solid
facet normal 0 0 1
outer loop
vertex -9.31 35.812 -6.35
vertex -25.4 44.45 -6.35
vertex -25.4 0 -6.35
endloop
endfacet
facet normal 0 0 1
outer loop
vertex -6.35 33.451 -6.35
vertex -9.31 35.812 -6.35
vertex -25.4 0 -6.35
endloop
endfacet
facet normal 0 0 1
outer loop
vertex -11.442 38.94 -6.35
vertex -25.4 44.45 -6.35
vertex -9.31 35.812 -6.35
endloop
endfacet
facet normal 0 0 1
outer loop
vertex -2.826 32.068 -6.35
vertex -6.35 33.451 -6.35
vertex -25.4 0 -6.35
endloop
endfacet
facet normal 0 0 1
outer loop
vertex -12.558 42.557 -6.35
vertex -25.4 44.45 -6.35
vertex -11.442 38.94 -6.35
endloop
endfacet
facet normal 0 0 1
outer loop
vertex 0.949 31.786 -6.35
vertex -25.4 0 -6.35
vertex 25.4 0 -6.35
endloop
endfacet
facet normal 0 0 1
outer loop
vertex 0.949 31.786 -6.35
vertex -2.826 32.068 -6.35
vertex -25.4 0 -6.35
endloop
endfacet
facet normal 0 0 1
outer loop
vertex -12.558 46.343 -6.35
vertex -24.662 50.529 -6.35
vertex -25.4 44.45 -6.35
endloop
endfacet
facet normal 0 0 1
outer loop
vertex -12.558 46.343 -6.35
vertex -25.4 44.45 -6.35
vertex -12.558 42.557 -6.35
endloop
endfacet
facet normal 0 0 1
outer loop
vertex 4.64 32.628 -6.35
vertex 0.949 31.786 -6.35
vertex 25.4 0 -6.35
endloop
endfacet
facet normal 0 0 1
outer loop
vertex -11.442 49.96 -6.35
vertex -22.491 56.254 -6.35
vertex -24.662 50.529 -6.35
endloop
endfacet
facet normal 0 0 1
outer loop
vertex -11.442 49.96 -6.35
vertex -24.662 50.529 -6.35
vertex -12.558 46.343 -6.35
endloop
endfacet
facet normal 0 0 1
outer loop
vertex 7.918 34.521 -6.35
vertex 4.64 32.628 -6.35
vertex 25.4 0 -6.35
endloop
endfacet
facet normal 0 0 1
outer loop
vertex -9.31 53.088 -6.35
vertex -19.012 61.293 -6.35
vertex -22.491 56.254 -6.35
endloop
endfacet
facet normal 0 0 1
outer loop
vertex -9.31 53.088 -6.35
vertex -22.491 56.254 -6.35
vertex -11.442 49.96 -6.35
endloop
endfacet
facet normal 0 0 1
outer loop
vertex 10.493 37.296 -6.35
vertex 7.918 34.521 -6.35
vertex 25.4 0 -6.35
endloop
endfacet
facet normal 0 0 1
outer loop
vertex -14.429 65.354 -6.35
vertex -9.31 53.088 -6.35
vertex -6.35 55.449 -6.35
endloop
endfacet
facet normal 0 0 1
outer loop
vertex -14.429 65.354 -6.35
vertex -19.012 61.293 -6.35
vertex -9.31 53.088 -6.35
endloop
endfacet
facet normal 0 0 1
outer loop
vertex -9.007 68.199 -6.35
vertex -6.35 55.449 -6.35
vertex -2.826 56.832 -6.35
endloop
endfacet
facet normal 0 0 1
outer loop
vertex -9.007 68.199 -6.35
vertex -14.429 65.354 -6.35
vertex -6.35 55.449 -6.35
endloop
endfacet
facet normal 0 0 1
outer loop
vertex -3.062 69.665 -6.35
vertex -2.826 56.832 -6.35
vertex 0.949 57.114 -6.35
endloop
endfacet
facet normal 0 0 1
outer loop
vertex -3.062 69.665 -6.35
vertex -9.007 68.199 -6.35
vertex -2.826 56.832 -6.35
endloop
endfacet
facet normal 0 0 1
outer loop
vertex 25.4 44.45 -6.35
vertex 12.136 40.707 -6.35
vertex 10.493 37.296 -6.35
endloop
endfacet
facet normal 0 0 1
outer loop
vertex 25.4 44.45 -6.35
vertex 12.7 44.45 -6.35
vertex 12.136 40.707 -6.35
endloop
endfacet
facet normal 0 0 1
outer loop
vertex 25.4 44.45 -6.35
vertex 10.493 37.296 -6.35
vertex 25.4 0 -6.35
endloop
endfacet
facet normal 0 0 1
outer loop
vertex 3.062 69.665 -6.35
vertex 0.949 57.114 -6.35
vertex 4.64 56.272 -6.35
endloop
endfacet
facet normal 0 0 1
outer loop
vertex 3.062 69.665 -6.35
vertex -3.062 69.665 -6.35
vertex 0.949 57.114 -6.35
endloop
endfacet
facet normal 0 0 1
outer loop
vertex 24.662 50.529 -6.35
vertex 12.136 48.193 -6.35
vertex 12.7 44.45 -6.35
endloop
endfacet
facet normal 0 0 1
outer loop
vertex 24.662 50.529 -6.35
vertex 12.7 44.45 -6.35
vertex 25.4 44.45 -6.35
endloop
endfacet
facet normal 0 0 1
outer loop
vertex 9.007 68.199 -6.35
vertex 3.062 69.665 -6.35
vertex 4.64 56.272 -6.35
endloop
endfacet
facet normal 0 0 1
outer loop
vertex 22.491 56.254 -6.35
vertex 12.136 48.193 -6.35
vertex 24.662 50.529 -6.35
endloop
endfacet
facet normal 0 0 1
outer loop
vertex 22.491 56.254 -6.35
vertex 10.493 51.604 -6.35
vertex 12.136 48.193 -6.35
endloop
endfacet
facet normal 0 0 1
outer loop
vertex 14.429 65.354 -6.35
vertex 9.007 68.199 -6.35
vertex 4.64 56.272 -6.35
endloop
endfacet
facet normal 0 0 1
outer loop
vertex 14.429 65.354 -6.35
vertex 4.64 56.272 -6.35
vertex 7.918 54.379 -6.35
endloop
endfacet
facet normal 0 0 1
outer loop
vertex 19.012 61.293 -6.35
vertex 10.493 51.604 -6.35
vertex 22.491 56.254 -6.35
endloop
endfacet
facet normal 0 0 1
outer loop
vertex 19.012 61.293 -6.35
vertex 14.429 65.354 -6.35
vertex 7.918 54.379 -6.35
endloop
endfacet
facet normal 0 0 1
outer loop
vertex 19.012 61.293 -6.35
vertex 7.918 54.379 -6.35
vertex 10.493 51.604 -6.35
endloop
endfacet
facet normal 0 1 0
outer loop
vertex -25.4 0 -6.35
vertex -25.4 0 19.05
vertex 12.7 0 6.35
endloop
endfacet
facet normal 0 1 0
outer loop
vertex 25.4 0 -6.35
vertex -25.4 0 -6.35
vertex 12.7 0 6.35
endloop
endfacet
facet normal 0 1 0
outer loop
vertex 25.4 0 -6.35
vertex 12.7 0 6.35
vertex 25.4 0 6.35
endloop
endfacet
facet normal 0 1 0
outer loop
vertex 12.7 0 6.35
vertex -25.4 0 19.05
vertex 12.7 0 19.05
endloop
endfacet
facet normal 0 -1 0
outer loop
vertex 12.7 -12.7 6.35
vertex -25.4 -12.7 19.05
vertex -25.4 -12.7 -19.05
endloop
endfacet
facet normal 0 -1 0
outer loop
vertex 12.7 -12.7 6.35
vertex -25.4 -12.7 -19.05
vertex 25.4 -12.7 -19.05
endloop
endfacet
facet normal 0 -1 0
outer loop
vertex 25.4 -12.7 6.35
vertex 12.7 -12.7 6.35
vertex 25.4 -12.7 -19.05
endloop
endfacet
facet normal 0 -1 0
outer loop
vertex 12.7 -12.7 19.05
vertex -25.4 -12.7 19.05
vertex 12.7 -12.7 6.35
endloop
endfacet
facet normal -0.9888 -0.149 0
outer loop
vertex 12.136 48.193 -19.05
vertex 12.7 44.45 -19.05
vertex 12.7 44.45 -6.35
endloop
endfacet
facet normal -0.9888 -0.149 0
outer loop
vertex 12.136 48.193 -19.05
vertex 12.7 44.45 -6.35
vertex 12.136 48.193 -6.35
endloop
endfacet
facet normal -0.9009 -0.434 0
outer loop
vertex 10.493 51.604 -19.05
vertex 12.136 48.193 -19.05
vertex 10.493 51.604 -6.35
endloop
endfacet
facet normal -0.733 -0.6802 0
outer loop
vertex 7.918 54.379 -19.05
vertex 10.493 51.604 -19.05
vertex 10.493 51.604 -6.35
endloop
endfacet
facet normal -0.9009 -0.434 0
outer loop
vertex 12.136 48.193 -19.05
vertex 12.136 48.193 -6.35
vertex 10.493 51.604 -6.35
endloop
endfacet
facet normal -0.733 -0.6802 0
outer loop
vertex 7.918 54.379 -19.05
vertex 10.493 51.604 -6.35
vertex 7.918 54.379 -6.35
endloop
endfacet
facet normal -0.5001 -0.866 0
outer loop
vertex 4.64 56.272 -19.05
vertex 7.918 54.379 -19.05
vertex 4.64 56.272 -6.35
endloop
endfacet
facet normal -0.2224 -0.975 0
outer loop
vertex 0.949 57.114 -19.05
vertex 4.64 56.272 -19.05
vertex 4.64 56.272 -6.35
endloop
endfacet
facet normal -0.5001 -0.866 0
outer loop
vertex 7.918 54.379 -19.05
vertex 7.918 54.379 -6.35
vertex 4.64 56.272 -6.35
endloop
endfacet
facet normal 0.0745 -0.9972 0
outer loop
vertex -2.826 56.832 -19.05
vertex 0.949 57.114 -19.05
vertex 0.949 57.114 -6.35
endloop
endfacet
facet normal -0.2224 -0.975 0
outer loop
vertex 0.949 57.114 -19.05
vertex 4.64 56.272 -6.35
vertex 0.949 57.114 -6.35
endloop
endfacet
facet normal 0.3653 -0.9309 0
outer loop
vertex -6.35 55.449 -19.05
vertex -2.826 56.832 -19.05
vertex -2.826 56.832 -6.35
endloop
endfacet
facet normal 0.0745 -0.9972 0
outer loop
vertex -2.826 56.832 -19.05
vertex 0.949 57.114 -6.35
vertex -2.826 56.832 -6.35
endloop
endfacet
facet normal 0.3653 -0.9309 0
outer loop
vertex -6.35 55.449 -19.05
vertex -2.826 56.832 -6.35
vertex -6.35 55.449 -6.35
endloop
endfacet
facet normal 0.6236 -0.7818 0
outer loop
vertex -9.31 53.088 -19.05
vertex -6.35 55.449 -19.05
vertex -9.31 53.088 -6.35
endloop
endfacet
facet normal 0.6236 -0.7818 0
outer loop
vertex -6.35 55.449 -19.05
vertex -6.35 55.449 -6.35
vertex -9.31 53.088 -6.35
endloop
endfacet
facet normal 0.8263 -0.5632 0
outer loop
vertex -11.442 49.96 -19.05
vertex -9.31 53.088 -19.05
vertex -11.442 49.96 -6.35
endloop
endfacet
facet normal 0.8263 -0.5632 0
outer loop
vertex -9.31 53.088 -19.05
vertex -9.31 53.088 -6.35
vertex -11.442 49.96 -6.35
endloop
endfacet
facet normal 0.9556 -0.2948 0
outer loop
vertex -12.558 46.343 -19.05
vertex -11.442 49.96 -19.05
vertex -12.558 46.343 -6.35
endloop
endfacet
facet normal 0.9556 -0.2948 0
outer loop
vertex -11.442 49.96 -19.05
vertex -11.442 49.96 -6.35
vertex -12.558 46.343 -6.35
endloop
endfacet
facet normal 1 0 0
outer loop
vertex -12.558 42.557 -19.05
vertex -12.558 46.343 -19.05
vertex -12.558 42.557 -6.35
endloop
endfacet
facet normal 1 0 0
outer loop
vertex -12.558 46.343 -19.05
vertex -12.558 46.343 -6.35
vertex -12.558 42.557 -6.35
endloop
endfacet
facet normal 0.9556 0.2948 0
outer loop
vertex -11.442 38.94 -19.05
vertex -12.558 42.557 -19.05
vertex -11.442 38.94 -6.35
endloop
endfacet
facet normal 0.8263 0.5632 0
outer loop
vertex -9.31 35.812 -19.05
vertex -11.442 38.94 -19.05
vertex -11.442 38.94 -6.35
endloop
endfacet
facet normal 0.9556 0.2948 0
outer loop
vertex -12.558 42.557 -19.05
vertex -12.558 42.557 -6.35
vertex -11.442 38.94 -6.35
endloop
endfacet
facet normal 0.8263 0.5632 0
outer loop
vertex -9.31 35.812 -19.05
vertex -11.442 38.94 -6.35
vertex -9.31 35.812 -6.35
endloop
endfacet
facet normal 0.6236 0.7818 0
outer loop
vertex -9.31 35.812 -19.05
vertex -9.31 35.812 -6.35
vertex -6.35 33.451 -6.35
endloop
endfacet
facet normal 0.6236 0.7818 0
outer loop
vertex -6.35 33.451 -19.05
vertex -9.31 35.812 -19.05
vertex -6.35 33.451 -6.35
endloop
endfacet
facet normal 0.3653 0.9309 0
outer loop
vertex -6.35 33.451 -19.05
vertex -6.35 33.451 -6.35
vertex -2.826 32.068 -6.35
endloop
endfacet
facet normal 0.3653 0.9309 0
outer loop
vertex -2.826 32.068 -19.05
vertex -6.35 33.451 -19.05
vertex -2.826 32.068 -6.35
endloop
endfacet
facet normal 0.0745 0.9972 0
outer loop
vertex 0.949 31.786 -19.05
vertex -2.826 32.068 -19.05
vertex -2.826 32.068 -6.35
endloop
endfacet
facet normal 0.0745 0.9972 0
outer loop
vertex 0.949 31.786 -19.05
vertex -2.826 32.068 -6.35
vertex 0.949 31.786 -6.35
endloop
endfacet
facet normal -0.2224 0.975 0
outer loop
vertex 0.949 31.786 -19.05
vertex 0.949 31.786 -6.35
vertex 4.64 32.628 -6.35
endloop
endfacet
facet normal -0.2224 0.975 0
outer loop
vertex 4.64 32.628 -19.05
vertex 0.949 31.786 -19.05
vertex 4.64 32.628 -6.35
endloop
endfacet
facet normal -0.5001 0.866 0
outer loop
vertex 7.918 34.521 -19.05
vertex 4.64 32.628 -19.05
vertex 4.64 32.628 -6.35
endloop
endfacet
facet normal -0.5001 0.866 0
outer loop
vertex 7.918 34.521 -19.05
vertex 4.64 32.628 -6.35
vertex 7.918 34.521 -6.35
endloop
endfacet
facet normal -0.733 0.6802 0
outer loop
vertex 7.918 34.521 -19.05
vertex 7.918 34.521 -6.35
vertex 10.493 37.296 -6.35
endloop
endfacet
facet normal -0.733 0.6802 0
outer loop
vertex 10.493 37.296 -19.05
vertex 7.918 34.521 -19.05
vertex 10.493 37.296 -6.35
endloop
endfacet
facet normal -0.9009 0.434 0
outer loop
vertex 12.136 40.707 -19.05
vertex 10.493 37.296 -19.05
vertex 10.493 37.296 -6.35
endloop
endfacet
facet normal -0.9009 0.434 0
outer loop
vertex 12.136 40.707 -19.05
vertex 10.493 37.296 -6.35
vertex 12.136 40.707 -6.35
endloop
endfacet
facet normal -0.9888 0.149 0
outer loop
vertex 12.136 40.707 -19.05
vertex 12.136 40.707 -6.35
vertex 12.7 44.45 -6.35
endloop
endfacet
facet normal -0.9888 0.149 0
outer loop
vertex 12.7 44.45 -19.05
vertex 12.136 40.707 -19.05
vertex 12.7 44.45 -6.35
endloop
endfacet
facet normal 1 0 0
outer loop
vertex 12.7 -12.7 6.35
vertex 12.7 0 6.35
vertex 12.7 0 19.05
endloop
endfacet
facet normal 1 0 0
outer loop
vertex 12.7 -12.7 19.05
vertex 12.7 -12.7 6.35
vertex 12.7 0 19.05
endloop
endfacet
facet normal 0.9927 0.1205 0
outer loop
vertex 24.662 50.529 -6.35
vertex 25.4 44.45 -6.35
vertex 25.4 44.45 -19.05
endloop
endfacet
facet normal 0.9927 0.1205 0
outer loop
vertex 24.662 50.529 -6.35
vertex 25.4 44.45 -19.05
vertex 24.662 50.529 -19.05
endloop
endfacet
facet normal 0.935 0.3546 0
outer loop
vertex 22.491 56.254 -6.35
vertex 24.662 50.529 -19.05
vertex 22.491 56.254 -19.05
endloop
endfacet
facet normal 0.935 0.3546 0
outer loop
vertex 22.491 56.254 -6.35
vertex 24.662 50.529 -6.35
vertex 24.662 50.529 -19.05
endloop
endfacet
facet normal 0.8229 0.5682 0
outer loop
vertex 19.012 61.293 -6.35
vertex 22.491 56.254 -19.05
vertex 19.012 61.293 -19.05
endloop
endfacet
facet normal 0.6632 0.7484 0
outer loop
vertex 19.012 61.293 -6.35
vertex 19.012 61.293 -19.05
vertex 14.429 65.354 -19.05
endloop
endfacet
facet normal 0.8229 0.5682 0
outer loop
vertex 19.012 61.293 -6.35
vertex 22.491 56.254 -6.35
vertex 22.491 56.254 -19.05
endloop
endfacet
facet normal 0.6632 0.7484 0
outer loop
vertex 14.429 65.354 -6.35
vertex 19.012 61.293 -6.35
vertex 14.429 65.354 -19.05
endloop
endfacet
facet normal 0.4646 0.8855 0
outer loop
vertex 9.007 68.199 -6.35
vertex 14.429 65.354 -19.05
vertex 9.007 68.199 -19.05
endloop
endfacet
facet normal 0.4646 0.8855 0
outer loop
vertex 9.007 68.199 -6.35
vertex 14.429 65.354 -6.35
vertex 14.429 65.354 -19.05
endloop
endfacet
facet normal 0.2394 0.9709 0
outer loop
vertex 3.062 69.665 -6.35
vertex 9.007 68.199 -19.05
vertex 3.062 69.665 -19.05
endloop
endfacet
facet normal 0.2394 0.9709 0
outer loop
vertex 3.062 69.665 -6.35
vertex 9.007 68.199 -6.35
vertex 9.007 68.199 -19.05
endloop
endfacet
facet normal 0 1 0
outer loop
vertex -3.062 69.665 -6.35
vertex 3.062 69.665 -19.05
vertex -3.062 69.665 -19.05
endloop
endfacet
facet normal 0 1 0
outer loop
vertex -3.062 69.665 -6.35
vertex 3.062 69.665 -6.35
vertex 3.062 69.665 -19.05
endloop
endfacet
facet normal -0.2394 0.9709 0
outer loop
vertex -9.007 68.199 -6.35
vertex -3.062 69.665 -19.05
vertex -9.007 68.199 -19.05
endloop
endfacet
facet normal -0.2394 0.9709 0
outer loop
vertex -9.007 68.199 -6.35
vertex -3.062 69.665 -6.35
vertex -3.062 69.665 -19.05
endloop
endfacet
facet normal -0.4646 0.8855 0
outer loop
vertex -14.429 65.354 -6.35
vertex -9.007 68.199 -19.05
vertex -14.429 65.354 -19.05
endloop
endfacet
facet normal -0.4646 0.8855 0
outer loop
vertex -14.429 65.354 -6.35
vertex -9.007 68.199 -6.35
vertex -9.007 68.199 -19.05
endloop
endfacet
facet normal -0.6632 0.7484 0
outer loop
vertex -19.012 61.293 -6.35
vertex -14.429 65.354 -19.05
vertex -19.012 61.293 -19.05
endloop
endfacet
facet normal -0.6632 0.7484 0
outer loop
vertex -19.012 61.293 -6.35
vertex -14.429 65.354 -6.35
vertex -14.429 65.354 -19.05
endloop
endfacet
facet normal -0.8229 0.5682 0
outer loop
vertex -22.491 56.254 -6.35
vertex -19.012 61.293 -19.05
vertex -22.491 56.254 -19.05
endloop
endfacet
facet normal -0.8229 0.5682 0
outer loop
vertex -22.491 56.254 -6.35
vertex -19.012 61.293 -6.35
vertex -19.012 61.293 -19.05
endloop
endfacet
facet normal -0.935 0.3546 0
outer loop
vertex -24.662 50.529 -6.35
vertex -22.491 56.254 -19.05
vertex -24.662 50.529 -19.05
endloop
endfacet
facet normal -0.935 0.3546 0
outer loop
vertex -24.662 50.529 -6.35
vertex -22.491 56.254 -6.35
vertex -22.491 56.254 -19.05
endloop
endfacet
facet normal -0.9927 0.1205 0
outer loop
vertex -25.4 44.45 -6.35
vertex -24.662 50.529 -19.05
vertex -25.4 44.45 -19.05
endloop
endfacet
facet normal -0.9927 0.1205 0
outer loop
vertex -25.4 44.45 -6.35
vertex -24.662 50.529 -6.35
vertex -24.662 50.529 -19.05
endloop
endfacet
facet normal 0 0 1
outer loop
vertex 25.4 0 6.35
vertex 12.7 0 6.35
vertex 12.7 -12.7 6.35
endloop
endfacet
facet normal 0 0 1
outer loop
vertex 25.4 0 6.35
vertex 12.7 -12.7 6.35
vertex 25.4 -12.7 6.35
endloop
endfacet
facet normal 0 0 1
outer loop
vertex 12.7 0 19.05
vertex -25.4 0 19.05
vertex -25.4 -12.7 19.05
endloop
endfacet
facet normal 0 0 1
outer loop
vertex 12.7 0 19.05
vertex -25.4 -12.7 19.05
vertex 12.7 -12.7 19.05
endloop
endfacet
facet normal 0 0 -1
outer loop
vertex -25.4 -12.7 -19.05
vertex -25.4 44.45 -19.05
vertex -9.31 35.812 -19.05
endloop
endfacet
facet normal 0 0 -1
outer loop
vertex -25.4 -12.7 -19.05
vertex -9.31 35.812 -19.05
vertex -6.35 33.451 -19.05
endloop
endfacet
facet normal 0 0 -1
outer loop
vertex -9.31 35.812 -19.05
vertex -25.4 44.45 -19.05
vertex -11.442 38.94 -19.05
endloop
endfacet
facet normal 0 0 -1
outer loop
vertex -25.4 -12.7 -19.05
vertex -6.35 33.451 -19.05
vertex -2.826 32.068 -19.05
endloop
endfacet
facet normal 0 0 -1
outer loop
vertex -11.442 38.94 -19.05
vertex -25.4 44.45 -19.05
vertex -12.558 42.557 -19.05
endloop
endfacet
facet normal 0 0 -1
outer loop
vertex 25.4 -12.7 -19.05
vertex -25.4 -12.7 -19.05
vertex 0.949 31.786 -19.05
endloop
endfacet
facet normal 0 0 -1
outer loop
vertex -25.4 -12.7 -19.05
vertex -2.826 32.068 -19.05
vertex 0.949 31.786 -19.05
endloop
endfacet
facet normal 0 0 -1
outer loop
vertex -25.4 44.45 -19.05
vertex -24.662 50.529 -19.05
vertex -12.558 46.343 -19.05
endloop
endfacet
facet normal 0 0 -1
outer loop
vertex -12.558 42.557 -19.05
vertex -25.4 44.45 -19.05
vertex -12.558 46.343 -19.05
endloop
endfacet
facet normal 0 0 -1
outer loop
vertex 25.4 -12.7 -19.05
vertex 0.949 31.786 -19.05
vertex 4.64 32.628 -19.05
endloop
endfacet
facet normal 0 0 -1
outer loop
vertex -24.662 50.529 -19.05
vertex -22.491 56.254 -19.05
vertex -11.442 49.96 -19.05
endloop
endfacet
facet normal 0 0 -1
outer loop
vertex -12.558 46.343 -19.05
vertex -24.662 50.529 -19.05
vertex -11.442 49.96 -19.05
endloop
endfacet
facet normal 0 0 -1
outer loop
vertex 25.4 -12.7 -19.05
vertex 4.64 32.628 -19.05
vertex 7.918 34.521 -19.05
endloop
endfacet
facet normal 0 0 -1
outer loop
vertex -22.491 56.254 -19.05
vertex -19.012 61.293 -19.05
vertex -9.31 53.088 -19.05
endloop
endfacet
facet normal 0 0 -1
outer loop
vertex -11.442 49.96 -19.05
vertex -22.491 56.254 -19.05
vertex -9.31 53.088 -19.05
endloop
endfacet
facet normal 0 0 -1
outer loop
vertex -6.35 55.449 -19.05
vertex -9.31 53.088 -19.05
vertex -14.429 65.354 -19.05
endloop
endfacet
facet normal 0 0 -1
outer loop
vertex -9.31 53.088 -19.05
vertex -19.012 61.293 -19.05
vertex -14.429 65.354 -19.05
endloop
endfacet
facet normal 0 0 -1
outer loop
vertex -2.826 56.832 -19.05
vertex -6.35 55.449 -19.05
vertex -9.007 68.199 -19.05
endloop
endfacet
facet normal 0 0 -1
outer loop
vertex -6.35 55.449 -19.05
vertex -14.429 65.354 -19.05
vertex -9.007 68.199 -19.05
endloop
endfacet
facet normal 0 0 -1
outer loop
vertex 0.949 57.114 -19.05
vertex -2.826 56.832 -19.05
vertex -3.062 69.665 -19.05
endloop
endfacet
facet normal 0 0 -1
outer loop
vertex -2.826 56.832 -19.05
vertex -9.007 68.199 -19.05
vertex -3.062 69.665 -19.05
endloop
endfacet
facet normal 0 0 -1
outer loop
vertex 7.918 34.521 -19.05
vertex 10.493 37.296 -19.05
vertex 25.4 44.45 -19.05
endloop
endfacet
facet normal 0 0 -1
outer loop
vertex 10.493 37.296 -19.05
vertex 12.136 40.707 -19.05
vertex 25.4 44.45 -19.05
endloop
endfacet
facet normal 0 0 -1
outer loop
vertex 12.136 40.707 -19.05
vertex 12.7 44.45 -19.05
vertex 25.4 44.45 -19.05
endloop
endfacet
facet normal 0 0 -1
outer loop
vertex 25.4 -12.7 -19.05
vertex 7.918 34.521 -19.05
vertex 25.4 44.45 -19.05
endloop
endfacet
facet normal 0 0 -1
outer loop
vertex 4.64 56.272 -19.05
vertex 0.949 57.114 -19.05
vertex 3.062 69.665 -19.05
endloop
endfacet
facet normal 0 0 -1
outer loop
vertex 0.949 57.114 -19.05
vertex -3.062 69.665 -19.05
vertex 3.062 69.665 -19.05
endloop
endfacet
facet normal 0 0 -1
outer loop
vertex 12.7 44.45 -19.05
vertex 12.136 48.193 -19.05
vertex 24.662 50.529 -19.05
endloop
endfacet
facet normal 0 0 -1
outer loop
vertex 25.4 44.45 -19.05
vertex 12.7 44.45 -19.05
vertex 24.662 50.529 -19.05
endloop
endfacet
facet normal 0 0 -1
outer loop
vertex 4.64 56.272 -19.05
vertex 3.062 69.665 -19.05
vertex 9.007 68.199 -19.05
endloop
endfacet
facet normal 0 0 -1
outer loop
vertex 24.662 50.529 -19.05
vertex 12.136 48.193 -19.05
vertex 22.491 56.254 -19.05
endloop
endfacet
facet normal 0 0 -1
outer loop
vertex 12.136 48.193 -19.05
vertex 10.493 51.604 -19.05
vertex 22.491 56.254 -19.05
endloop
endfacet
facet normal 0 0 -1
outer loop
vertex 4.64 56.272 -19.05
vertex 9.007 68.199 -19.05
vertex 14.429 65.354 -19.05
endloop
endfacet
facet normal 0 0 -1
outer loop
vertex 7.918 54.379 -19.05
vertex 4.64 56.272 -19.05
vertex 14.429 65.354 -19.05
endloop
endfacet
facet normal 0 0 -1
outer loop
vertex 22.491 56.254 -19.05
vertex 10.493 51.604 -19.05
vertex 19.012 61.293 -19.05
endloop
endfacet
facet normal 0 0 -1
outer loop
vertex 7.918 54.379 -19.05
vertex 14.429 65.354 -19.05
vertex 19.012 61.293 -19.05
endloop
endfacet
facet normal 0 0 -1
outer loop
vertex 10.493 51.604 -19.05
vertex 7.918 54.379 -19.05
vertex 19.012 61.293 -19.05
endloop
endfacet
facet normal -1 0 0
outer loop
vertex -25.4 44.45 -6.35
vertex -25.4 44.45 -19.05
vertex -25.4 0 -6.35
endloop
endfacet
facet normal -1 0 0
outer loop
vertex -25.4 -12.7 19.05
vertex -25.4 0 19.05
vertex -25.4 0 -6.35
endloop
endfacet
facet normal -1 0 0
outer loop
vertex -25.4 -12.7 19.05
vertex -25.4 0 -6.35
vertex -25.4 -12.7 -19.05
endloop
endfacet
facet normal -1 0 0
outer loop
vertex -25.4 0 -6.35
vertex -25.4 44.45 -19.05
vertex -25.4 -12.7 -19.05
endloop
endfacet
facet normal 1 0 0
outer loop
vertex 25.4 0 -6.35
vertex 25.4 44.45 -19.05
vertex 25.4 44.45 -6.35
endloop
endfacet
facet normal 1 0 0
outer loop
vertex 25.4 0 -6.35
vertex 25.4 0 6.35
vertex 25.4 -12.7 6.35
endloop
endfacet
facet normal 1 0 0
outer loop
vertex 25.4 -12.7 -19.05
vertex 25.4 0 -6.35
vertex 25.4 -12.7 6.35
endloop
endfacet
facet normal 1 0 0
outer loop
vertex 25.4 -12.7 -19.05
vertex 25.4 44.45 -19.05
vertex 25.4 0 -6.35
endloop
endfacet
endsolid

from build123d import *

# Parameters (mm, degrees)
F0_W     = 50.8
F0_H     = 38.1
F1_DEPTH = 12.7
F2_W     = 17.091405
F2_H     = 15.964834
F3_DEPTH = 12.701
F4_W     = 50.8
F4_H     = 44.45
F5_DEPTH = 12.7
F7_DEPTH = 12.7
F8_R     = 12.7
F9_DEPTH = 12.701


with BuildPart() as f1:
    # F0 (on Front) → F1 (new body)
    with BuildSketch(Plane.XZ):
        Rectangle(F0_W, F0_H)
    extrude(amount=F1_DEPTH)

    # F2 (on Front) → F3 (cut, through all)
    with BuildSketch(Plane.XZ):
        with Locations((21.245703, 14.332417)):
            Rectangle(F2_W, F2_H)
    extrude(amount=F3_DEPTH, mode=Mode.SUBTRACT)

    # F4 (on face) → F5 (join)
    with BuildSketch(Plane(origin=(0, 0, -19.05), x_dir=(1, 0, 0), z_dir=(0, 0, -1))):
        with Locations((0, -22.225)):
            Rectangle(F4_W, F4_H)
    extrude(amount=-F5_DEPTH)

    # F6 (on face) → F7 (join)
    with BuildSketch(Plane.XY.offset(-6.35)):
        with BuildLine():
            Line((-25.4, 44.45), (25.4, 44.45))
            ThreePointArc((25.4, 44.45), (0, 69.85), (-25.4, 44.45))
        make_face()
    extrude(amount=-F7_DEPTH)

    # F8 (on face) → F9 (cut, through all)
    with BuildSketch(Plane.XY.offset(-6.35)):
        with Locations((0, 44.45)):
            Circle(F8_R)
    extrude(amount=-F9_DEPTH, mode=Mode.SUBTRACT)


solid = f1.part
